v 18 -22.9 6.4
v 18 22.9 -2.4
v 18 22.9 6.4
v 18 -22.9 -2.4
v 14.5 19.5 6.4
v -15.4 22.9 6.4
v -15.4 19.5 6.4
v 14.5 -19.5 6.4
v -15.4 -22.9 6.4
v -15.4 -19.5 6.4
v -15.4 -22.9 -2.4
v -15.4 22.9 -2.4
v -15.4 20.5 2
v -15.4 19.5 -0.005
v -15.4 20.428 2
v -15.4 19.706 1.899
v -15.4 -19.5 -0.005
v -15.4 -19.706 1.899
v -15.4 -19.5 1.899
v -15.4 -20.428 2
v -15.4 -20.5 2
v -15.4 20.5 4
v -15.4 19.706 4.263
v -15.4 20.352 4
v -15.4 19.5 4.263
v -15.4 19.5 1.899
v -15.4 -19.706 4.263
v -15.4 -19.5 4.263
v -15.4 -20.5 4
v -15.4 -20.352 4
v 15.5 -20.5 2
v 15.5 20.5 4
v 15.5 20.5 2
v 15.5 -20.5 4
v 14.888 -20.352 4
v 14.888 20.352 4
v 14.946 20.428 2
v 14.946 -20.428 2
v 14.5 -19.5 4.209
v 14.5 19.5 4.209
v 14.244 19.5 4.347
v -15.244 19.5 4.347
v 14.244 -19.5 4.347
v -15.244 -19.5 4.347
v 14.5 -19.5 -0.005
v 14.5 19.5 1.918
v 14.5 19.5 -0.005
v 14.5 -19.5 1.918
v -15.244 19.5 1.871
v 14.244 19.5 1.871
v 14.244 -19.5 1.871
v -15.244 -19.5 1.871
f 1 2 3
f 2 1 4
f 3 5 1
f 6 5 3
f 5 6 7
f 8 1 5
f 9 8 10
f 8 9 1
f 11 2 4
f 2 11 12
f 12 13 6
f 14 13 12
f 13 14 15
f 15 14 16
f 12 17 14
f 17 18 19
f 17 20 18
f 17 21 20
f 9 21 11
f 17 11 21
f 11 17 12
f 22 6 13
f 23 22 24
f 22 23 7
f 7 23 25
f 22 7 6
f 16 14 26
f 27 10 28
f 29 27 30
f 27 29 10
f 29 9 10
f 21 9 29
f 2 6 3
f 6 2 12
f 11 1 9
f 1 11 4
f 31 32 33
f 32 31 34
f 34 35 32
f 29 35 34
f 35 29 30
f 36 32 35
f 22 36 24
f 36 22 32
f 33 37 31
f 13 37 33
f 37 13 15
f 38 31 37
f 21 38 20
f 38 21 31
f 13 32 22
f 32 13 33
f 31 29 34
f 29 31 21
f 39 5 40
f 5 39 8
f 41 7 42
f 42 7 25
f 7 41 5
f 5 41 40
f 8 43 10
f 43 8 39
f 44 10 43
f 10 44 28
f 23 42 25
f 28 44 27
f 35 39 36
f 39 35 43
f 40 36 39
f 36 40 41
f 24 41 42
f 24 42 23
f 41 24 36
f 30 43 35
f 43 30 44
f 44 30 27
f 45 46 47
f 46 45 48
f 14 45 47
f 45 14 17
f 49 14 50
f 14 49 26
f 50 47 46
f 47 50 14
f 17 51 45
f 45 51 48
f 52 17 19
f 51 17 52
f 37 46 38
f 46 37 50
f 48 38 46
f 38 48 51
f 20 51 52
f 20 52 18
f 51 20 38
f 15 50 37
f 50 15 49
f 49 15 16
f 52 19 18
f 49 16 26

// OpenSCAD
// preview[view:west, tilt:top diagonal]
pcb_height=31;
pcb_width=41;
pcb_thick=2;
grove=1;
walls=2.4;
bottom_offset=2;
chamfer_top=7;//[0:10]
chamfer_bottom=3;//[0:10]

chamfer_top_=chamfer_top/10;
chamfer_bottom_=chamfer_bottom/10;

difference(){
//box
translate([walls/2+0.1,0,pcb_thick/2+bottom_offset/2]){
cube([pcb_height+walls,pcb_width+walls*2,pcb_thick+walls*2+bottom_offset],center=true);
}

//pcb
color("green")
translate([0,0,pcb_thick/2+bottom_offset]){
cube([pcb_height,pcb_width,pcb_thick],center=true);
}

//grove
color("blue")
translate([-grove/2,0,pcb_thick+walls/2+bottom_offset]){
cube([pcb_height-grove,pcb_width-grove*2,walls+0.01],center=true);
}


//chamfer top
color("red")
translate([-grove/2,0,pcb_thick+walls/2+bottom_offset-0.01]){
linear_extrude(height = walls+0.1, center = true, convexity = 3, scale = chamfer_top_){
square(size = [pcb_height, pcb_width], center = true);
}
}

//bottom offset
color("Gray")
translate([-grove/2,0,bottom_offset/2]){
cube([pcb_height-grove,pcb_width-grove*2,bottom_offset+0.01],center=true);
}

//chamfer bottom
color("Purple")
translate([-grove/2,0,bottom_offset/2+0.01]){
mirror([0,0,1]) 
linear_extrude(height = bottom_offset, center = true, convexity = 3, scale = chamfer_bottom_){
square(size = [pcb_height, pcb_width], center = true);
}
}

}
